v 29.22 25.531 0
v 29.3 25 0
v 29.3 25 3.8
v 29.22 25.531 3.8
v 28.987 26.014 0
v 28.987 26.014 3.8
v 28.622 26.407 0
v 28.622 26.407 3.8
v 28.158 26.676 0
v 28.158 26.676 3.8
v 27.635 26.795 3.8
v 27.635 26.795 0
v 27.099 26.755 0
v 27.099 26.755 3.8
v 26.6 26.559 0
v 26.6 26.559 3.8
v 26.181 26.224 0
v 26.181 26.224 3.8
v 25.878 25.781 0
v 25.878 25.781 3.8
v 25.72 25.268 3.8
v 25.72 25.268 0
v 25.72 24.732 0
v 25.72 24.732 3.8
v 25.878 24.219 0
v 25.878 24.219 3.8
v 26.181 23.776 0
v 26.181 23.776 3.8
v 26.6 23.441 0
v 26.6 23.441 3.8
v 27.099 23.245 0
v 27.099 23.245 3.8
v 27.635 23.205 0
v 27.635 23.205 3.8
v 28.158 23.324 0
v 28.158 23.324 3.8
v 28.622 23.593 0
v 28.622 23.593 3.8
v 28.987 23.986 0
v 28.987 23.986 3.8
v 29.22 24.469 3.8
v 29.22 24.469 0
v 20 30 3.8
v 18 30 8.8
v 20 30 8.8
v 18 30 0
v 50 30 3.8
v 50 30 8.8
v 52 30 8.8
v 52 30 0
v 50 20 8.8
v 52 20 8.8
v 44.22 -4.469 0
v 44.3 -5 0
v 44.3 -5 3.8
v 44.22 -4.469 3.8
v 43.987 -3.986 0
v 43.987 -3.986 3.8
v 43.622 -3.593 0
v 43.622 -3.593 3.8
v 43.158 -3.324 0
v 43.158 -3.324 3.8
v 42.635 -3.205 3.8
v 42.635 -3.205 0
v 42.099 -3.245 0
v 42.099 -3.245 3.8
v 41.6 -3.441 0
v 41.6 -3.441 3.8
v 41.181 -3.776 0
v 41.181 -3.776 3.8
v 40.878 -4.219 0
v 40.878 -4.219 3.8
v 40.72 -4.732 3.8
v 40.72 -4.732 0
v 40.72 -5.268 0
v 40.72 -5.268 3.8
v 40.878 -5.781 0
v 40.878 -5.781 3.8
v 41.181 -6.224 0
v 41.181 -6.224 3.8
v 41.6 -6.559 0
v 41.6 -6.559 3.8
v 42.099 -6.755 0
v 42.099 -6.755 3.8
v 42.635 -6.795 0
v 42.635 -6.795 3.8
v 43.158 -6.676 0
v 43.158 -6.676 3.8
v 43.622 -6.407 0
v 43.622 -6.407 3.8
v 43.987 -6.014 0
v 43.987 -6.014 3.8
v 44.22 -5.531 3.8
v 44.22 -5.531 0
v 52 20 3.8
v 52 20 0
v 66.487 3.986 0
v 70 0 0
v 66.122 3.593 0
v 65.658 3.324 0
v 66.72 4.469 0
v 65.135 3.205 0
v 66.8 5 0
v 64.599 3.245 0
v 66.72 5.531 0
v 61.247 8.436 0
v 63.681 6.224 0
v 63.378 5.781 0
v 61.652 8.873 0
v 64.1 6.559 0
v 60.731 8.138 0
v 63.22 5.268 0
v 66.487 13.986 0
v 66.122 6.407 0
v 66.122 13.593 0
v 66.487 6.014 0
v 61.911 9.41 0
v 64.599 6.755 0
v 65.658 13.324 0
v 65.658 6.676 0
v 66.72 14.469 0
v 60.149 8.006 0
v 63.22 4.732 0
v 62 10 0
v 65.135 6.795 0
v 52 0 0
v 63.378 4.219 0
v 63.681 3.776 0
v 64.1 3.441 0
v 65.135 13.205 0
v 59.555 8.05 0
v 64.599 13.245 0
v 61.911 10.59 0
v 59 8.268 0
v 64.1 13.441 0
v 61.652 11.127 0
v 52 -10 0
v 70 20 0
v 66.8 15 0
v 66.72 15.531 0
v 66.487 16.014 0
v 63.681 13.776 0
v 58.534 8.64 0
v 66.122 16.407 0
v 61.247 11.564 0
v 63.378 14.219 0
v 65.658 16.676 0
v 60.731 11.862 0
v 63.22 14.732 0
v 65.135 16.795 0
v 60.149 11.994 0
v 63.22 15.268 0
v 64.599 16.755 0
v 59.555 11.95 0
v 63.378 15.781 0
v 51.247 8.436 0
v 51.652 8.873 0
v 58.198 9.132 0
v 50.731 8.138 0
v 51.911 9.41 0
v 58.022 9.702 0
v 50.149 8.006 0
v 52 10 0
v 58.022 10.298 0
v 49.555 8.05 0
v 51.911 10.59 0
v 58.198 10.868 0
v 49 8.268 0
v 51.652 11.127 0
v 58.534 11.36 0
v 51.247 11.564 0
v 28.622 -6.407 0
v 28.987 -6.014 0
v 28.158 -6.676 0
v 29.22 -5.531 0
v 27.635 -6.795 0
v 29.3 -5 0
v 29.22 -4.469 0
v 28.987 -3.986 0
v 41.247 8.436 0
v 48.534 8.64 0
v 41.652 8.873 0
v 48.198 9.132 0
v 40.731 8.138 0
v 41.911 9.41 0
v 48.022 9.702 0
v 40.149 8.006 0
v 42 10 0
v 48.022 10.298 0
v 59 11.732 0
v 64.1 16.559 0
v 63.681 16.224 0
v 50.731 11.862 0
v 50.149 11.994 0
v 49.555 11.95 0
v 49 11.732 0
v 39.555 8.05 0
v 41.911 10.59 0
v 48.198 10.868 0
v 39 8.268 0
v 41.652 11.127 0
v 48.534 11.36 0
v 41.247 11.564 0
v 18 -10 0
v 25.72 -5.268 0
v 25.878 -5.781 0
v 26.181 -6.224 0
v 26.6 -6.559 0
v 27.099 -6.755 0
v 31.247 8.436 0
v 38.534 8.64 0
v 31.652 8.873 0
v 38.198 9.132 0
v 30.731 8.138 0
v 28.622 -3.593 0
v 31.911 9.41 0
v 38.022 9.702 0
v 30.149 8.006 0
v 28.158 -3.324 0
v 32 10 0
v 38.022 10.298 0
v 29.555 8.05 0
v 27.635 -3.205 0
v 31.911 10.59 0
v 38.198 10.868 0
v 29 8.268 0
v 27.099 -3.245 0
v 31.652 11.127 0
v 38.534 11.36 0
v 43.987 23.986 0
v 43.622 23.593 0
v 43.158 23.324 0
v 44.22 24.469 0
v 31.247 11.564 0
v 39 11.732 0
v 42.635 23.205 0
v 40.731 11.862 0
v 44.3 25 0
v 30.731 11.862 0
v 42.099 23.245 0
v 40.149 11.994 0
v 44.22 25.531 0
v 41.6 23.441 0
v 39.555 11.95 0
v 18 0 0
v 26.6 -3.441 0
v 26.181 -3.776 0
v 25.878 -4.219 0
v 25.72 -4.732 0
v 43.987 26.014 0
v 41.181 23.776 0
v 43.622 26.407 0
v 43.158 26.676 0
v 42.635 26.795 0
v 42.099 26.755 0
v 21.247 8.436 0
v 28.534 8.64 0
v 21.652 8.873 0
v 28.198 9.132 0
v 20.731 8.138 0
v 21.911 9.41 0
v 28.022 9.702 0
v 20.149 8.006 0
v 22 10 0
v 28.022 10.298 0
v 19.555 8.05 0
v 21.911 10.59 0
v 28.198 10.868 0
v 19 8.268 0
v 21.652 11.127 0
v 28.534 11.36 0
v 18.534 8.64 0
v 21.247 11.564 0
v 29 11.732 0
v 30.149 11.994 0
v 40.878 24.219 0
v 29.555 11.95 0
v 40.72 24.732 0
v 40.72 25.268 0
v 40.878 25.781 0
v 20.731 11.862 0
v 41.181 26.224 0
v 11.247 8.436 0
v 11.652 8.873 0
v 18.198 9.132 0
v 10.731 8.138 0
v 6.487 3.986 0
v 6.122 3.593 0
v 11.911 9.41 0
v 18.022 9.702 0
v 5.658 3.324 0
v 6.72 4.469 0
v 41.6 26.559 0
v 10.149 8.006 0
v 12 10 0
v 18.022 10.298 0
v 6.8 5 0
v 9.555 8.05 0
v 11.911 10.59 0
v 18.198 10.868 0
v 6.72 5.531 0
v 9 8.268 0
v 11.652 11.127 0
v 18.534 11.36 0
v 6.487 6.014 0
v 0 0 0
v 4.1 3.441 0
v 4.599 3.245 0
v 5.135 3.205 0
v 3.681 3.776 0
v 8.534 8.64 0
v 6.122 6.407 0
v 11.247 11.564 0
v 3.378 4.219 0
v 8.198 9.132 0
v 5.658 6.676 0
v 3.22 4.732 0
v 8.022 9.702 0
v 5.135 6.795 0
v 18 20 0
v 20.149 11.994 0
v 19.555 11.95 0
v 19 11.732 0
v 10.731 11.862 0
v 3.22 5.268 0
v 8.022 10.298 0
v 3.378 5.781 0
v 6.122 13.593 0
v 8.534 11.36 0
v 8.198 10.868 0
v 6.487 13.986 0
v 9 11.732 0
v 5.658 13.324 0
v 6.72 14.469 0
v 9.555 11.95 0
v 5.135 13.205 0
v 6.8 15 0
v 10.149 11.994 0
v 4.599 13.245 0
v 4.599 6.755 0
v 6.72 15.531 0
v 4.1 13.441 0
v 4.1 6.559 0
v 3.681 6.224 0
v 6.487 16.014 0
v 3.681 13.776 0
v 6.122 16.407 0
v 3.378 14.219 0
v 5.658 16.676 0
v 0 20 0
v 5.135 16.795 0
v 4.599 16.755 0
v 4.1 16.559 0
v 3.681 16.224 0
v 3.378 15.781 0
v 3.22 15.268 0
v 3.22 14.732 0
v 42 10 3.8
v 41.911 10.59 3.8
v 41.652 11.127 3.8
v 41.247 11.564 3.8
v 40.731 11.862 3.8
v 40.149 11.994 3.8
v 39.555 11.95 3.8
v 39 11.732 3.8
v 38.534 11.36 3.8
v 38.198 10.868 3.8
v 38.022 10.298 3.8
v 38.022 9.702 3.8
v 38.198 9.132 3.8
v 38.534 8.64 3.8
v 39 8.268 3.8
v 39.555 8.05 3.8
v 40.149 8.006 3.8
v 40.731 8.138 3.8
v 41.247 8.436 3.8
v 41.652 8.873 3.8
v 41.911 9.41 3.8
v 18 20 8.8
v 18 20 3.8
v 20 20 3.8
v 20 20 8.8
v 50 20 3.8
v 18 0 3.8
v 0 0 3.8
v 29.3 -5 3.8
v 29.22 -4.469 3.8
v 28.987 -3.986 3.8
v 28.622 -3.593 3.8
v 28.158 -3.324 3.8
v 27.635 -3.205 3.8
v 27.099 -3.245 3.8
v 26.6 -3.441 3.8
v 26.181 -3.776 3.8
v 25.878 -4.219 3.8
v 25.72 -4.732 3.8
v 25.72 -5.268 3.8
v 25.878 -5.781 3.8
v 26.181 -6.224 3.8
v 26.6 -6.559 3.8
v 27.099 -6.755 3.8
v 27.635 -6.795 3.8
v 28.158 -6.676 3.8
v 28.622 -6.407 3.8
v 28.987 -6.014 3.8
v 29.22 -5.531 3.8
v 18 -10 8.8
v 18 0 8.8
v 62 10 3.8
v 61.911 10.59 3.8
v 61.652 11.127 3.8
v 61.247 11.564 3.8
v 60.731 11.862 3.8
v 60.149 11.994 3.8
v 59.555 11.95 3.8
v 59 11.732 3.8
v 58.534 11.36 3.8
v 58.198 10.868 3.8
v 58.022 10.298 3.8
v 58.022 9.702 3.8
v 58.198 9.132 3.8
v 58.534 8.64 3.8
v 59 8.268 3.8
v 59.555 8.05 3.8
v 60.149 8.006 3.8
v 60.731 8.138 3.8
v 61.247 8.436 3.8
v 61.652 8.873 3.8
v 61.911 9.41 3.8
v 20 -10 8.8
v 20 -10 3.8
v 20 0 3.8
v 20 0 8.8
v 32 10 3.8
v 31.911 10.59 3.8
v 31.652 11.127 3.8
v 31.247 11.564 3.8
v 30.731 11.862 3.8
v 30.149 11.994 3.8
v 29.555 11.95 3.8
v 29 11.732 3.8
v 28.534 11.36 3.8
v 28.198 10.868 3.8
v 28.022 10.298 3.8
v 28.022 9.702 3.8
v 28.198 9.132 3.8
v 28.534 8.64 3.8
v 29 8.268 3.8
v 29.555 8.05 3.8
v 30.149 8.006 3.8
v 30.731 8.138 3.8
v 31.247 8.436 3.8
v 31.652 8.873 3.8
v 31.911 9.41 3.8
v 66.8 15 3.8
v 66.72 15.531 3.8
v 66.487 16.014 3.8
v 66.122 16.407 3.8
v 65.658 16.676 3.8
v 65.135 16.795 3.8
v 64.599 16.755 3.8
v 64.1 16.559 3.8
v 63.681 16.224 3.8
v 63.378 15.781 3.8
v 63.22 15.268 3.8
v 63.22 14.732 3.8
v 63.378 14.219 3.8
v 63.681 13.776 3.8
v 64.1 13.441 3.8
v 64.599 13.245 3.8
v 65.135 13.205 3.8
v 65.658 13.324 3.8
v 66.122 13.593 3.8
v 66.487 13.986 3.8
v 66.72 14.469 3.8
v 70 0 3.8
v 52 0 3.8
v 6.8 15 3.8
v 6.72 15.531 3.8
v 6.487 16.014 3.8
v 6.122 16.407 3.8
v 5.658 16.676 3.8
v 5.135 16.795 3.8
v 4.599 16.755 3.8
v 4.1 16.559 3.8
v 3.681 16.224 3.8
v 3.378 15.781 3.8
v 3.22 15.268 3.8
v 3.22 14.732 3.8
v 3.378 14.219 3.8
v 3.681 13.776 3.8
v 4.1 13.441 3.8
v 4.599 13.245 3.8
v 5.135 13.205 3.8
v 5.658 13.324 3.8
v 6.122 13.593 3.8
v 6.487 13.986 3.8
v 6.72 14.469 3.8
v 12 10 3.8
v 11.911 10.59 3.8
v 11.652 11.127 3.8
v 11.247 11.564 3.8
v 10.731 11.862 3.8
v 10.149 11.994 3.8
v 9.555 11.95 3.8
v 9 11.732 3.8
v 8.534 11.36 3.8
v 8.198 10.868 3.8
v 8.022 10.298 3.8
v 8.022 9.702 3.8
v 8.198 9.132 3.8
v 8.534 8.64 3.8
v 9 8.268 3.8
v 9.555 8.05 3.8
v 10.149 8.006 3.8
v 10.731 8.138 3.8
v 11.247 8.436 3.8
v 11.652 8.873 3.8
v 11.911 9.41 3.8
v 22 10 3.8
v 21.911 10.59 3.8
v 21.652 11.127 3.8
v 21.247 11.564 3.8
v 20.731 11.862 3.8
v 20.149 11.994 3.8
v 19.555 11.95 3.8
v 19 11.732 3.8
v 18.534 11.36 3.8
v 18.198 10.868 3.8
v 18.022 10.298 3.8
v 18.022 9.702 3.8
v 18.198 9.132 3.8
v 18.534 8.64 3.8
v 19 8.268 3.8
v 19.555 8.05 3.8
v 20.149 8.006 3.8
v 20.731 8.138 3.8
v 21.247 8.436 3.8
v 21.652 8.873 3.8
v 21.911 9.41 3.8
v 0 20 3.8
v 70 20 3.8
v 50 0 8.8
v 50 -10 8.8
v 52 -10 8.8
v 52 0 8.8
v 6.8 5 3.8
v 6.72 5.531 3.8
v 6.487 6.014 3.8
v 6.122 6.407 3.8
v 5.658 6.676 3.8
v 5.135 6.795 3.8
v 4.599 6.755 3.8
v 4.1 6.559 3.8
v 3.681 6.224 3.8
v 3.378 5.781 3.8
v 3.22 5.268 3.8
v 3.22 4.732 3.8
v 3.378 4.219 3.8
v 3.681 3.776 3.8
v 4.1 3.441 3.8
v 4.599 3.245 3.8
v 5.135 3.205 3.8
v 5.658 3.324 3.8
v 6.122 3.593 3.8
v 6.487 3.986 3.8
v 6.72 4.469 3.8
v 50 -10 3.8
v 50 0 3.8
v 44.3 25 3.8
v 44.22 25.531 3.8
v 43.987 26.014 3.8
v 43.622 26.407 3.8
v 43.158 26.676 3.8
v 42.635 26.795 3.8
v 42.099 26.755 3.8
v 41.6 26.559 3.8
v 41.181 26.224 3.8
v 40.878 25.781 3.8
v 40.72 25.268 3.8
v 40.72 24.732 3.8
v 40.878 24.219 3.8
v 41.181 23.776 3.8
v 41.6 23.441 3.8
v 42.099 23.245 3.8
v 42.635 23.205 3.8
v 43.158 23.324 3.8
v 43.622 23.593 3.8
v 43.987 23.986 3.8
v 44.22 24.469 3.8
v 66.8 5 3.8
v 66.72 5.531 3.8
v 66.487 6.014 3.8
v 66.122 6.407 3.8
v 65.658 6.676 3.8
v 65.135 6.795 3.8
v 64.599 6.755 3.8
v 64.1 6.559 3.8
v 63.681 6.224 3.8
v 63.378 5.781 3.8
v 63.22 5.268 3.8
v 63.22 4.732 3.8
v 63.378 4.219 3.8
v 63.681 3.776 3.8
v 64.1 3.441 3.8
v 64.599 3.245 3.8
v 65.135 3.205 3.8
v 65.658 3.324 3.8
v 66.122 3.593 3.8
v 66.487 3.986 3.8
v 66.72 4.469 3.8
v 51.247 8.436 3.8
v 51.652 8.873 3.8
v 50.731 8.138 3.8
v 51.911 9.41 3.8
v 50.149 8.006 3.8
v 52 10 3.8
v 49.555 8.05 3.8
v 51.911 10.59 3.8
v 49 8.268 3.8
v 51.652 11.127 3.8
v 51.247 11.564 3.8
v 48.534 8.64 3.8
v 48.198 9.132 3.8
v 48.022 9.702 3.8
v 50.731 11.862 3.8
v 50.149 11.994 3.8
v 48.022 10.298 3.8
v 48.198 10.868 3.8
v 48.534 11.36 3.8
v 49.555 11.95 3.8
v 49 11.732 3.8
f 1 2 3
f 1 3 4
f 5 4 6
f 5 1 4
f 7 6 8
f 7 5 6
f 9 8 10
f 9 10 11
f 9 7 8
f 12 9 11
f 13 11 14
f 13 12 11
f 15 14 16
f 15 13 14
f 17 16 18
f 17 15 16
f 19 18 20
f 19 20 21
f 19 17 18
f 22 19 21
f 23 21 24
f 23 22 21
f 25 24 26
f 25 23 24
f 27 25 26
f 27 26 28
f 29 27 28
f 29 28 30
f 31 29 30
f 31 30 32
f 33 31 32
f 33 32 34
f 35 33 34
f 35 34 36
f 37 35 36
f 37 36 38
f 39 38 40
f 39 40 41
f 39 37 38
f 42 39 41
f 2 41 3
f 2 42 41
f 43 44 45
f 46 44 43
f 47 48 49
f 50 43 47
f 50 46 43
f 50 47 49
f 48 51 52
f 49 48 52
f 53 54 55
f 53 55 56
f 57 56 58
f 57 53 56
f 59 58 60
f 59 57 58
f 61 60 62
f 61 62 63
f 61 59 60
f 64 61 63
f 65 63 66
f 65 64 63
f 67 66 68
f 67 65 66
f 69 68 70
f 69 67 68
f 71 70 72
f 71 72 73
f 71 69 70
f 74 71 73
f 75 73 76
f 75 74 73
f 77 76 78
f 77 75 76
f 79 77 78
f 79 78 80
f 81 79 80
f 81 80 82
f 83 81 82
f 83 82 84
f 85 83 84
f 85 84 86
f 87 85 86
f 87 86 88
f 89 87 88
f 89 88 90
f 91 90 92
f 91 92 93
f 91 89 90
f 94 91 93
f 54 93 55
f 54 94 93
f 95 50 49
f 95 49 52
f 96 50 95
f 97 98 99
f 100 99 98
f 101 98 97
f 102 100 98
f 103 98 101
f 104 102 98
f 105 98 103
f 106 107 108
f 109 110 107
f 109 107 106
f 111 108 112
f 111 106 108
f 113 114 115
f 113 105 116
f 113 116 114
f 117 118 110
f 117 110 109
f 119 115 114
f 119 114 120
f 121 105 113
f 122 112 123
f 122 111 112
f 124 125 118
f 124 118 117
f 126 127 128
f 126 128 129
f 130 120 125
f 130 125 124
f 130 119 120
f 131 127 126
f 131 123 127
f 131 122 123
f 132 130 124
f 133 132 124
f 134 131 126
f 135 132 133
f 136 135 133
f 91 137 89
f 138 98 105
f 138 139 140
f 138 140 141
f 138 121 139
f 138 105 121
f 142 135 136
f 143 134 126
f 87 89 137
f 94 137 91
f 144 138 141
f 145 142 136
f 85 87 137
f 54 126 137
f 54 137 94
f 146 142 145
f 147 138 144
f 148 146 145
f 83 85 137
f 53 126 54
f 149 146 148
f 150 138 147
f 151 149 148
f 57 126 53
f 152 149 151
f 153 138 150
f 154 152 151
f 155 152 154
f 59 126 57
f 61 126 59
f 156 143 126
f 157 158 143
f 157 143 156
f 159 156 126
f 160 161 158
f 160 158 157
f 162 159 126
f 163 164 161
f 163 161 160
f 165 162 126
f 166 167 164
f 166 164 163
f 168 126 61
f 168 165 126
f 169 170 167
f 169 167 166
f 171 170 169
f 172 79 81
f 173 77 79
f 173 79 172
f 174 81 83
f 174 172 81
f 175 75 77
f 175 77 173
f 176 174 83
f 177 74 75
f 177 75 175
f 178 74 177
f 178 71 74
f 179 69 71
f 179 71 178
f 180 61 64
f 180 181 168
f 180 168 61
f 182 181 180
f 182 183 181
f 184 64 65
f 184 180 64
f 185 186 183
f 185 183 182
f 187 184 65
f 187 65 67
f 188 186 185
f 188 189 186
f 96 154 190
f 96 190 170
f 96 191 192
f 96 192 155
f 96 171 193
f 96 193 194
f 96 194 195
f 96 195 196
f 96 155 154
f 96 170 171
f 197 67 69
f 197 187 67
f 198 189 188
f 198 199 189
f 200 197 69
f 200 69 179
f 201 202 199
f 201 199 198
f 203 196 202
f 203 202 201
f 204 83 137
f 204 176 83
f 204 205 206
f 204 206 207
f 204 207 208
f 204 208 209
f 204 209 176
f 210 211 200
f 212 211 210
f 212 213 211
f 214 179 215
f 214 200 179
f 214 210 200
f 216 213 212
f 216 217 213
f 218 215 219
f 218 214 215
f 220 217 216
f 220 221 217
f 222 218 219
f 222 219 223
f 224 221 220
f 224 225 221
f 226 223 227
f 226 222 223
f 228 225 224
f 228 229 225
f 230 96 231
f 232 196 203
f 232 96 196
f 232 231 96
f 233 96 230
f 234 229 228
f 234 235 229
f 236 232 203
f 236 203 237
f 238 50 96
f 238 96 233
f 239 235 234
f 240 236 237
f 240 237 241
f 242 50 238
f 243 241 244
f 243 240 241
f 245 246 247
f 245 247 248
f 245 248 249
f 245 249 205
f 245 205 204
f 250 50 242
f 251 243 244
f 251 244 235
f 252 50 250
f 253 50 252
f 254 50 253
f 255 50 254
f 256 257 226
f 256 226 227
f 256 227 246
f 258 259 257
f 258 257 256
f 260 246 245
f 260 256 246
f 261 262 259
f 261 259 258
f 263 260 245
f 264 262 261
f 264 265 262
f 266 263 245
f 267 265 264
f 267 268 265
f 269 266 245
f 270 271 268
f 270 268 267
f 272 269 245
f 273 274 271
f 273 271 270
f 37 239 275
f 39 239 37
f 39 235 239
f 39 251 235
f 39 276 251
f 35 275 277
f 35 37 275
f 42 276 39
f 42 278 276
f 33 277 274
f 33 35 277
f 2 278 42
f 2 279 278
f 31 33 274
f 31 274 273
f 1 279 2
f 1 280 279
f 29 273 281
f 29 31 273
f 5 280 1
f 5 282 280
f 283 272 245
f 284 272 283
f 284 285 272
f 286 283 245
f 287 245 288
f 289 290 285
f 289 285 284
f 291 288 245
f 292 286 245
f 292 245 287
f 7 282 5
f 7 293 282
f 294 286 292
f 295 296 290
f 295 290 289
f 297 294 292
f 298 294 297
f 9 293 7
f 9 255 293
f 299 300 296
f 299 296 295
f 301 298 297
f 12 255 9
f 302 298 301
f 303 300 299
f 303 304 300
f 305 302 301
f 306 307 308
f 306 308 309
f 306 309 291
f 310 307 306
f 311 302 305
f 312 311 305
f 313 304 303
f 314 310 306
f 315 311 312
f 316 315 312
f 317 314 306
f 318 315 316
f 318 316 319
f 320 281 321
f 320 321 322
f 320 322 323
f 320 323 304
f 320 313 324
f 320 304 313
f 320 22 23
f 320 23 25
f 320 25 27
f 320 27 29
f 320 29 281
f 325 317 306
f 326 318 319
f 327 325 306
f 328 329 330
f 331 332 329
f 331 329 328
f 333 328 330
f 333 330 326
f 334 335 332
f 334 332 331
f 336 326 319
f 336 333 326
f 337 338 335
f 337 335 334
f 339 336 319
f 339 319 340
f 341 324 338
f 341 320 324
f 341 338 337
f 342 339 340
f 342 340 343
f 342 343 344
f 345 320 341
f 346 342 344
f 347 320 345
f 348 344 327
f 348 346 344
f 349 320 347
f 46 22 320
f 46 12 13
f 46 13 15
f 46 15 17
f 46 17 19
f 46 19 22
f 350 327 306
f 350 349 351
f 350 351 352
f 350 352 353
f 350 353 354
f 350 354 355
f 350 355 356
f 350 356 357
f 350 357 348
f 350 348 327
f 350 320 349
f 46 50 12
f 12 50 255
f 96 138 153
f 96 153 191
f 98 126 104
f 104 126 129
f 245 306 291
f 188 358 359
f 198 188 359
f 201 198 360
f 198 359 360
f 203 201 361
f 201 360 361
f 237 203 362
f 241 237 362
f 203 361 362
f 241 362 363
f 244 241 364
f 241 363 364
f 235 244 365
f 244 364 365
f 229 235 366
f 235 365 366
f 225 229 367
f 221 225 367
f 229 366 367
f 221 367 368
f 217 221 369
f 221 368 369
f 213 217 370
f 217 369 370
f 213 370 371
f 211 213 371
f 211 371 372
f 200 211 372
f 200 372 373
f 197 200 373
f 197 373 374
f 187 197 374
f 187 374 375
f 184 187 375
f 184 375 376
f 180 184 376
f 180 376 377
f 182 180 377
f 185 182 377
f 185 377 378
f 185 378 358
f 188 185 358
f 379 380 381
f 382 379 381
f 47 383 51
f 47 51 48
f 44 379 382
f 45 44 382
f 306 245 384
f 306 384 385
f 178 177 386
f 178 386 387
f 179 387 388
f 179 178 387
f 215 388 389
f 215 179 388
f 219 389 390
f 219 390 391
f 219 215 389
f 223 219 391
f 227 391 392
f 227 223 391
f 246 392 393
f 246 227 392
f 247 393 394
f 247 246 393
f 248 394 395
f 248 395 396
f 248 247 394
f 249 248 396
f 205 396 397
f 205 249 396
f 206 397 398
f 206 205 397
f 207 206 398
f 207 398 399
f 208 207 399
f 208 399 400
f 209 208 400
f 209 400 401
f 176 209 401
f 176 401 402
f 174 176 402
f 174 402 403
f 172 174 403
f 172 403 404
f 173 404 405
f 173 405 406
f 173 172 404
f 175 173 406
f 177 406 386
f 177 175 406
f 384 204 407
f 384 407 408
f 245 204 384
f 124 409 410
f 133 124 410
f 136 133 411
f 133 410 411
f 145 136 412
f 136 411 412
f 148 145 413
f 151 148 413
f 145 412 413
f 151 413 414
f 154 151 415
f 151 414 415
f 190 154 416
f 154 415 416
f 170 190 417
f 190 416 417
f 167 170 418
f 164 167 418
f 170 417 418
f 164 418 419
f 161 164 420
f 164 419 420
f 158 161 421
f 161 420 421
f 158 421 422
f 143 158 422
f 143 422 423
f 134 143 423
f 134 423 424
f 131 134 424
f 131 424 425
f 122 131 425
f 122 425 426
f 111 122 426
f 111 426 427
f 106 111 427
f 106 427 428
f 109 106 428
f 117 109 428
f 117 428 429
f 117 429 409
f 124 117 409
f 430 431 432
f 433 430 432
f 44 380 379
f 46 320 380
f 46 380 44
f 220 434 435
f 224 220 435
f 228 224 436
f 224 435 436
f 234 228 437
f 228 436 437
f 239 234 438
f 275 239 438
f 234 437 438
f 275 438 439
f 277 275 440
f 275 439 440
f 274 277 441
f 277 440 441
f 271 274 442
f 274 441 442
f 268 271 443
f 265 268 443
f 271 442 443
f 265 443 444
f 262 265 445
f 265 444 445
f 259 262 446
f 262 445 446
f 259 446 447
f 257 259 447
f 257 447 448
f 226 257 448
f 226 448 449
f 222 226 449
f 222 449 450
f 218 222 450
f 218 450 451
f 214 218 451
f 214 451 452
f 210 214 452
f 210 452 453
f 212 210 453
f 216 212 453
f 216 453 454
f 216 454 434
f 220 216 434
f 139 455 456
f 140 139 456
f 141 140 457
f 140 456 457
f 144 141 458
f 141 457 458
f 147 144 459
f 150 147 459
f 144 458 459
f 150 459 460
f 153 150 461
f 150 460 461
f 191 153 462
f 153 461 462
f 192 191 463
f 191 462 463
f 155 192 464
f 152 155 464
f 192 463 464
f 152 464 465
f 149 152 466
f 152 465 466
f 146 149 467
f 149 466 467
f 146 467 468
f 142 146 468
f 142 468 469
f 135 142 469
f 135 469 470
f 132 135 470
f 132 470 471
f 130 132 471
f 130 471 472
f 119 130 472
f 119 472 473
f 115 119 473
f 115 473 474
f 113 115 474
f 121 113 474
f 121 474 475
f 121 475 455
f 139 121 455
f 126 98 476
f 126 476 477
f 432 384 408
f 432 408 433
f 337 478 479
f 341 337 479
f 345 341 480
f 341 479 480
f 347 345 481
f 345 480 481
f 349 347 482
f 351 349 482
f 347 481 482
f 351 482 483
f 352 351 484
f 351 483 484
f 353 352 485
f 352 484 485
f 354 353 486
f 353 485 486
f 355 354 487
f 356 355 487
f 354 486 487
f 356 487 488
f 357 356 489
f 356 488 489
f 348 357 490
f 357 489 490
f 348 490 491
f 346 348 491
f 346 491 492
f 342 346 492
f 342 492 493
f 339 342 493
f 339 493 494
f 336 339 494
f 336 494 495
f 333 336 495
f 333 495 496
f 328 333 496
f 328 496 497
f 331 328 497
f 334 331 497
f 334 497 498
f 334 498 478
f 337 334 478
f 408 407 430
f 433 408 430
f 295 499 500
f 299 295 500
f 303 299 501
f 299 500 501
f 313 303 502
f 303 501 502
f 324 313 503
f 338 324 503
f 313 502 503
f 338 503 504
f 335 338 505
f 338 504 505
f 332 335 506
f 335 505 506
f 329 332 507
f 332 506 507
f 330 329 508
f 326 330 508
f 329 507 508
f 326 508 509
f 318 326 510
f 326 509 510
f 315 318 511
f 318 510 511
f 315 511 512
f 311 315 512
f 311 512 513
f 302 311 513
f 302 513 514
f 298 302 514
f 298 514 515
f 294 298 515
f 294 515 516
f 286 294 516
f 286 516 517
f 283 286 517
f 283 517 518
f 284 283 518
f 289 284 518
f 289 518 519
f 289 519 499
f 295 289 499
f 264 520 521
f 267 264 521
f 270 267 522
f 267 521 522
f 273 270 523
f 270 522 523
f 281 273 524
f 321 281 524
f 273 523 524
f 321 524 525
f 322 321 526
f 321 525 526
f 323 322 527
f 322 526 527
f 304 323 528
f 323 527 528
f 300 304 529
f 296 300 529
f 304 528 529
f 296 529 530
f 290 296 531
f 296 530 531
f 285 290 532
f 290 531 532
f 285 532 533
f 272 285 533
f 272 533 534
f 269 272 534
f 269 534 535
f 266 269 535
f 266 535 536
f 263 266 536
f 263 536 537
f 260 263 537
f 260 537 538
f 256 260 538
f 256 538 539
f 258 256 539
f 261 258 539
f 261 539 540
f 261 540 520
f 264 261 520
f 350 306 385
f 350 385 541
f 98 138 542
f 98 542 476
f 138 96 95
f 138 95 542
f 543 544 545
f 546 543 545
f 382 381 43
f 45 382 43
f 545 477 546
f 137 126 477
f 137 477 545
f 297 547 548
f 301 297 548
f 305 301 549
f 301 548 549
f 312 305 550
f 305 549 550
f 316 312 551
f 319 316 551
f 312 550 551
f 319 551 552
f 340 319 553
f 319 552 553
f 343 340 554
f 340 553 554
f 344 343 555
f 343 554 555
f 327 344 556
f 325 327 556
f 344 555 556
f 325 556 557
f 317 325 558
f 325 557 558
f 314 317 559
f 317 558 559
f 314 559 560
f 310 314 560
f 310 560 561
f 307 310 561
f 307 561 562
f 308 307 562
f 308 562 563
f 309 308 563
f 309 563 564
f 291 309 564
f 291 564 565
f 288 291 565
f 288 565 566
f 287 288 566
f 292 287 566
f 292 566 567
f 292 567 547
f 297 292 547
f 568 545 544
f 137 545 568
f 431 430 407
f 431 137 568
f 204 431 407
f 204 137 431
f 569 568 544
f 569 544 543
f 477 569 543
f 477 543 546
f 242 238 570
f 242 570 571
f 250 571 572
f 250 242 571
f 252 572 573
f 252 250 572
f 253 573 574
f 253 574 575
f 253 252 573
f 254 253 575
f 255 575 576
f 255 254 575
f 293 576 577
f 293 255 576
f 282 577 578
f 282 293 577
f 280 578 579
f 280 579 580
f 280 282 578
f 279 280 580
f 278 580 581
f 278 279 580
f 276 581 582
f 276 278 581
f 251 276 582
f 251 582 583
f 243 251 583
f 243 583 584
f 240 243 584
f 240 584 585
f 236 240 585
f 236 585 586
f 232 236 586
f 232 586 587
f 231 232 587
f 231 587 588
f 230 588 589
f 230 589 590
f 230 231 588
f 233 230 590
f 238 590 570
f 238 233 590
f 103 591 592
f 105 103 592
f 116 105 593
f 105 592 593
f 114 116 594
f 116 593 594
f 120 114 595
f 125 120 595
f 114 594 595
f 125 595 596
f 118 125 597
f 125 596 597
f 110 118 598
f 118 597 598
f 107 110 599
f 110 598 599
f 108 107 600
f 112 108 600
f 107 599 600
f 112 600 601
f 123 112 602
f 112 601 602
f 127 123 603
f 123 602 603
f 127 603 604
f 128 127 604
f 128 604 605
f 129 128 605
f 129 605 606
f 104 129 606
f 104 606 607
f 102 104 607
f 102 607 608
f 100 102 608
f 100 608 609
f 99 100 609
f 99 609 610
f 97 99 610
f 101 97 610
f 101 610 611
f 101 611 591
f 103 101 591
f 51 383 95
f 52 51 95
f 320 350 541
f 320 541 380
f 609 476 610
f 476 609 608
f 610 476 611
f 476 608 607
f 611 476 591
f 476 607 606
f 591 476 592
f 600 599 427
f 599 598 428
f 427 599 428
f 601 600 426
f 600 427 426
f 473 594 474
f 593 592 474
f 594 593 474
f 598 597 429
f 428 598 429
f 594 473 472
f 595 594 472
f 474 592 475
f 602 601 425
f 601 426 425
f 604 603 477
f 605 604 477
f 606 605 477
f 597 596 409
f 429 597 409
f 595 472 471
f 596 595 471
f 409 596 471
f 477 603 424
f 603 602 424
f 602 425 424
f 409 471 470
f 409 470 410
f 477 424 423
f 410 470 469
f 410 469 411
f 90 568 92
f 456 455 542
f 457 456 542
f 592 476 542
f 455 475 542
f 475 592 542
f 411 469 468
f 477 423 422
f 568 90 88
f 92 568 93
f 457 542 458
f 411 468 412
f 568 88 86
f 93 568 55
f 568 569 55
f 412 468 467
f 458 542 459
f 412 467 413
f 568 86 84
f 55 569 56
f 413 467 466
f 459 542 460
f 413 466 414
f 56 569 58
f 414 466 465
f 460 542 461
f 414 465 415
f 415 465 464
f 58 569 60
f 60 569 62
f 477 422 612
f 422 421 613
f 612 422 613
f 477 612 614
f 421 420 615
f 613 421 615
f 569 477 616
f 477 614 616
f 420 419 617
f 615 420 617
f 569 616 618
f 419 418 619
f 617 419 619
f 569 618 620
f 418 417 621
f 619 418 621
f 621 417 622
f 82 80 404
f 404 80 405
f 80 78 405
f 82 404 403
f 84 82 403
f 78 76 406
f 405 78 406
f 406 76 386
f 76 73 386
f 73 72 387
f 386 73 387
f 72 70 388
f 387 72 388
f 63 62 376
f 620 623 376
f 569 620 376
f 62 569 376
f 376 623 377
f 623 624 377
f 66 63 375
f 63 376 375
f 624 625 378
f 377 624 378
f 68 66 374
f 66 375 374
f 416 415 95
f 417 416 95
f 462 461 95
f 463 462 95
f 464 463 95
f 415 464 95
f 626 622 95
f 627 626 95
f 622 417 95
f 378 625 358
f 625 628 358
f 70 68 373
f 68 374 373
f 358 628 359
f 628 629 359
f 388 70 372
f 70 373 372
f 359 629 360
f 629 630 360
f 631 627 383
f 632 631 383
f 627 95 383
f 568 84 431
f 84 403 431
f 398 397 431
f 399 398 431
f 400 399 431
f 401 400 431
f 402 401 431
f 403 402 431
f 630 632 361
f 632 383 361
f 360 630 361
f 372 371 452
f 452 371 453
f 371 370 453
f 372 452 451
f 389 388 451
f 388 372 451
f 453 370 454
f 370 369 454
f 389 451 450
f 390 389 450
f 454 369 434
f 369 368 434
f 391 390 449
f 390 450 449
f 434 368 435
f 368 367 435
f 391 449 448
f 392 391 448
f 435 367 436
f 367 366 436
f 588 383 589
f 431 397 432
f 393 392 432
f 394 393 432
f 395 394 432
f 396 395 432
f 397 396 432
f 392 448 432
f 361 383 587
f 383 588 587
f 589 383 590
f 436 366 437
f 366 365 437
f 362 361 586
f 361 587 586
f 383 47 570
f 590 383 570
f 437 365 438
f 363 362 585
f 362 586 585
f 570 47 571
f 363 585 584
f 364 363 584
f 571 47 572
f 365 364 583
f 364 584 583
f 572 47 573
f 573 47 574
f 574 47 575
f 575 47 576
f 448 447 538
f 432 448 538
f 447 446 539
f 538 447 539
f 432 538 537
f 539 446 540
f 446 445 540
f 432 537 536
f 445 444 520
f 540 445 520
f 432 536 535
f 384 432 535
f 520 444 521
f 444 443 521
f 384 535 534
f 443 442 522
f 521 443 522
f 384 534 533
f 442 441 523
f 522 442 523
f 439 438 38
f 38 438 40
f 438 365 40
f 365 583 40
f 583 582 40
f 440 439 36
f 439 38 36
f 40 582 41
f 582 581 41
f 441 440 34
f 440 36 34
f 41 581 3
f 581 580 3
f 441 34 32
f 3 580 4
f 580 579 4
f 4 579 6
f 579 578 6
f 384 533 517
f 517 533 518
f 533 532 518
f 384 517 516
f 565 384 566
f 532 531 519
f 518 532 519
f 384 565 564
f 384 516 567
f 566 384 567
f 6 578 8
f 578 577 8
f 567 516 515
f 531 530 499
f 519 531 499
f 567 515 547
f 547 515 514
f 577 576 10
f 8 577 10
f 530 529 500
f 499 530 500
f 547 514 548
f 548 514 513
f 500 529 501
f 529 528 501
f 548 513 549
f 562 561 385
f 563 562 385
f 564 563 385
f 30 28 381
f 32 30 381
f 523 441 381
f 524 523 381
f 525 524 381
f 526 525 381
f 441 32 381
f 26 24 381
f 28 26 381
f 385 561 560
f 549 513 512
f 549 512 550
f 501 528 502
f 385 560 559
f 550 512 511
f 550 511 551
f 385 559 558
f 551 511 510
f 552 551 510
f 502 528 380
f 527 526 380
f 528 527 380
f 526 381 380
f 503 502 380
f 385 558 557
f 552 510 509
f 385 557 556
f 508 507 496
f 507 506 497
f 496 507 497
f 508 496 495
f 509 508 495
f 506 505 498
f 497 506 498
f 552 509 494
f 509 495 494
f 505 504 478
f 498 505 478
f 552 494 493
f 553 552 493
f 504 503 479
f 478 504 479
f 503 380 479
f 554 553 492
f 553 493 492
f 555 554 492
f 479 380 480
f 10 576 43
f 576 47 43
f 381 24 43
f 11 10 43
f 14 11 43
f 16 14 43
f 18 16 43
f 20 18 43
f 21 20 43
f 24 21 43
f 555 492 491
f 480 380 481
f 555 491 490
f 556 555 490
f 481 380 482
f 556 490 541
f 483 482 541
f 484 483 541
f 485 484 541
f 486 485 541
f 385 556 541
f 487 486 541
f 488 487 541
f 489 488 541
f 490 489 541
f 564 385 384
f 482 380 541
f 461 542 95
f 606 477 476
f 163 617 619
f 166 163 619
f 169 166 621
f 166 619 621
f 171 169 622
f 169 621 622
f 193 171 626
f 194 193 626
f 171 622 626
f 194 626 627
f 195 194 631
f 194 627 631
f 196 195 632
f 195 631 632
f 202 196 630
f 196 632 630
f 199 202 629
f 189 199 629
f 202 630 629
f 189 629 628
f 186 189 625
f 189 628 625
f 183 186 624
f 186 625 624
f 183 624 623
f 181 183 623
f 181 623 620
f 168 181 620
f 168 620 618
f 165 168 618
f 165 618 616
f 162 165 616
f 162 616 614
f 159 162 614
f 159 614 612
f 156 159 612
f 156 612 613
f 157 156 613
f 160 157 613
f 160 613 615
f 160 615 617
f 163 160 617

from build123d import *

# Parameters (mm, degrees)
SKETCH_R        = 1.8
PAD_DEPTH       = 3.8
SKETCH001_R     = 1.8
POCKET_DEPTH    = 5
SKETCH002_W     = 2
SKETCH002_H     = 10
PAD001_DEPTH    = 5
SKETCH003_R     = 2
POCKET001_DEPTH = 5


with BuildPart() as part:
    # Sketch → Pad (new body)
    with BuildSketch(Plane.XY):
        Polygon((0, 0), (0, 20), (18, 20), (18, 30), (52, 30), (52, 20), (70, 20), (70, 0), (52, 0), (52, -10), (18, -10), (18, 0), align=None)
        with Locations((27.5, 25)):
            Circle(SKETCH_R, mode=Mode.SUBTRACT)
        with Locations((42.5, 25)):
            Circle(SKETCH_R, mode=Mode.SUBTRACT)
        with Locations((27.5, -5)):
            Circle(SKETCH_R, mode=Mode.SUBTRACT)
        with Locations((42.5, -5)):
            Circle(SKETCH_R, mode=Mode.SUBTRACT)
    extrude(amount=PAD_DEPTH)

    # Sketch001 → Pocket (cut)
    with BuildSketch(Plane.XY.offset(3.8)):
        with Locations((5, 15)):
            Circle(SKETCH001_R)
        with Locations((65, 15)):
            Circle(SKETCH001_R)
        with Locations((65, 5)):
            Circle(SKETCH001_R)
        with Locations((5, 5)):
            Circle(SKETCH001_R)
    extrude(amount=-POCKET_DEPTH, mode=Mode.SUBTRACT)

    # Sketch002 → Pad001 (new body)
    with BuildSketch(Plane.XY.offset(3.8)):
        with Locations((19, 25)):
            Rectangle(SKETCH002_W, SKETCH002_H)
        with Locations((51, 25)):
            Rectangle(SKETCH002_W, SKETCH002_H)
        with Locations((51, -5)):
            Rectangle(SKETCH002_W, SKETCH002_H)
        with Locations((19, -5)):
            Rectangle(SKETCH002_W, SKETCH002_H)
    extrude(amount=PAD001_DEPTH)

    # Sketch003 → Pocket001 (cut)
    with BuildSketch(Plane.XY.offset(3.8)):
        with Locations((10, 10)):
            Circle(SKETCH003_R)
        with Locations((20, 10)):
            Circle(SKETCH003_R)
        with Locations((30, 10)):
            Circle(SKETCH003_R)
        with Locations((40, 10)):
            Circle(SKETCH003_R)
        with Locations((50, 10)):
            Circle(SKETCH003_R)
        with Locations((60, 10)):
            Circle(SKETCH003_R)
    extrude(amount=-POCKET001_DEPTH, mode=Mode.SUBTRACT)


solid = part.part
